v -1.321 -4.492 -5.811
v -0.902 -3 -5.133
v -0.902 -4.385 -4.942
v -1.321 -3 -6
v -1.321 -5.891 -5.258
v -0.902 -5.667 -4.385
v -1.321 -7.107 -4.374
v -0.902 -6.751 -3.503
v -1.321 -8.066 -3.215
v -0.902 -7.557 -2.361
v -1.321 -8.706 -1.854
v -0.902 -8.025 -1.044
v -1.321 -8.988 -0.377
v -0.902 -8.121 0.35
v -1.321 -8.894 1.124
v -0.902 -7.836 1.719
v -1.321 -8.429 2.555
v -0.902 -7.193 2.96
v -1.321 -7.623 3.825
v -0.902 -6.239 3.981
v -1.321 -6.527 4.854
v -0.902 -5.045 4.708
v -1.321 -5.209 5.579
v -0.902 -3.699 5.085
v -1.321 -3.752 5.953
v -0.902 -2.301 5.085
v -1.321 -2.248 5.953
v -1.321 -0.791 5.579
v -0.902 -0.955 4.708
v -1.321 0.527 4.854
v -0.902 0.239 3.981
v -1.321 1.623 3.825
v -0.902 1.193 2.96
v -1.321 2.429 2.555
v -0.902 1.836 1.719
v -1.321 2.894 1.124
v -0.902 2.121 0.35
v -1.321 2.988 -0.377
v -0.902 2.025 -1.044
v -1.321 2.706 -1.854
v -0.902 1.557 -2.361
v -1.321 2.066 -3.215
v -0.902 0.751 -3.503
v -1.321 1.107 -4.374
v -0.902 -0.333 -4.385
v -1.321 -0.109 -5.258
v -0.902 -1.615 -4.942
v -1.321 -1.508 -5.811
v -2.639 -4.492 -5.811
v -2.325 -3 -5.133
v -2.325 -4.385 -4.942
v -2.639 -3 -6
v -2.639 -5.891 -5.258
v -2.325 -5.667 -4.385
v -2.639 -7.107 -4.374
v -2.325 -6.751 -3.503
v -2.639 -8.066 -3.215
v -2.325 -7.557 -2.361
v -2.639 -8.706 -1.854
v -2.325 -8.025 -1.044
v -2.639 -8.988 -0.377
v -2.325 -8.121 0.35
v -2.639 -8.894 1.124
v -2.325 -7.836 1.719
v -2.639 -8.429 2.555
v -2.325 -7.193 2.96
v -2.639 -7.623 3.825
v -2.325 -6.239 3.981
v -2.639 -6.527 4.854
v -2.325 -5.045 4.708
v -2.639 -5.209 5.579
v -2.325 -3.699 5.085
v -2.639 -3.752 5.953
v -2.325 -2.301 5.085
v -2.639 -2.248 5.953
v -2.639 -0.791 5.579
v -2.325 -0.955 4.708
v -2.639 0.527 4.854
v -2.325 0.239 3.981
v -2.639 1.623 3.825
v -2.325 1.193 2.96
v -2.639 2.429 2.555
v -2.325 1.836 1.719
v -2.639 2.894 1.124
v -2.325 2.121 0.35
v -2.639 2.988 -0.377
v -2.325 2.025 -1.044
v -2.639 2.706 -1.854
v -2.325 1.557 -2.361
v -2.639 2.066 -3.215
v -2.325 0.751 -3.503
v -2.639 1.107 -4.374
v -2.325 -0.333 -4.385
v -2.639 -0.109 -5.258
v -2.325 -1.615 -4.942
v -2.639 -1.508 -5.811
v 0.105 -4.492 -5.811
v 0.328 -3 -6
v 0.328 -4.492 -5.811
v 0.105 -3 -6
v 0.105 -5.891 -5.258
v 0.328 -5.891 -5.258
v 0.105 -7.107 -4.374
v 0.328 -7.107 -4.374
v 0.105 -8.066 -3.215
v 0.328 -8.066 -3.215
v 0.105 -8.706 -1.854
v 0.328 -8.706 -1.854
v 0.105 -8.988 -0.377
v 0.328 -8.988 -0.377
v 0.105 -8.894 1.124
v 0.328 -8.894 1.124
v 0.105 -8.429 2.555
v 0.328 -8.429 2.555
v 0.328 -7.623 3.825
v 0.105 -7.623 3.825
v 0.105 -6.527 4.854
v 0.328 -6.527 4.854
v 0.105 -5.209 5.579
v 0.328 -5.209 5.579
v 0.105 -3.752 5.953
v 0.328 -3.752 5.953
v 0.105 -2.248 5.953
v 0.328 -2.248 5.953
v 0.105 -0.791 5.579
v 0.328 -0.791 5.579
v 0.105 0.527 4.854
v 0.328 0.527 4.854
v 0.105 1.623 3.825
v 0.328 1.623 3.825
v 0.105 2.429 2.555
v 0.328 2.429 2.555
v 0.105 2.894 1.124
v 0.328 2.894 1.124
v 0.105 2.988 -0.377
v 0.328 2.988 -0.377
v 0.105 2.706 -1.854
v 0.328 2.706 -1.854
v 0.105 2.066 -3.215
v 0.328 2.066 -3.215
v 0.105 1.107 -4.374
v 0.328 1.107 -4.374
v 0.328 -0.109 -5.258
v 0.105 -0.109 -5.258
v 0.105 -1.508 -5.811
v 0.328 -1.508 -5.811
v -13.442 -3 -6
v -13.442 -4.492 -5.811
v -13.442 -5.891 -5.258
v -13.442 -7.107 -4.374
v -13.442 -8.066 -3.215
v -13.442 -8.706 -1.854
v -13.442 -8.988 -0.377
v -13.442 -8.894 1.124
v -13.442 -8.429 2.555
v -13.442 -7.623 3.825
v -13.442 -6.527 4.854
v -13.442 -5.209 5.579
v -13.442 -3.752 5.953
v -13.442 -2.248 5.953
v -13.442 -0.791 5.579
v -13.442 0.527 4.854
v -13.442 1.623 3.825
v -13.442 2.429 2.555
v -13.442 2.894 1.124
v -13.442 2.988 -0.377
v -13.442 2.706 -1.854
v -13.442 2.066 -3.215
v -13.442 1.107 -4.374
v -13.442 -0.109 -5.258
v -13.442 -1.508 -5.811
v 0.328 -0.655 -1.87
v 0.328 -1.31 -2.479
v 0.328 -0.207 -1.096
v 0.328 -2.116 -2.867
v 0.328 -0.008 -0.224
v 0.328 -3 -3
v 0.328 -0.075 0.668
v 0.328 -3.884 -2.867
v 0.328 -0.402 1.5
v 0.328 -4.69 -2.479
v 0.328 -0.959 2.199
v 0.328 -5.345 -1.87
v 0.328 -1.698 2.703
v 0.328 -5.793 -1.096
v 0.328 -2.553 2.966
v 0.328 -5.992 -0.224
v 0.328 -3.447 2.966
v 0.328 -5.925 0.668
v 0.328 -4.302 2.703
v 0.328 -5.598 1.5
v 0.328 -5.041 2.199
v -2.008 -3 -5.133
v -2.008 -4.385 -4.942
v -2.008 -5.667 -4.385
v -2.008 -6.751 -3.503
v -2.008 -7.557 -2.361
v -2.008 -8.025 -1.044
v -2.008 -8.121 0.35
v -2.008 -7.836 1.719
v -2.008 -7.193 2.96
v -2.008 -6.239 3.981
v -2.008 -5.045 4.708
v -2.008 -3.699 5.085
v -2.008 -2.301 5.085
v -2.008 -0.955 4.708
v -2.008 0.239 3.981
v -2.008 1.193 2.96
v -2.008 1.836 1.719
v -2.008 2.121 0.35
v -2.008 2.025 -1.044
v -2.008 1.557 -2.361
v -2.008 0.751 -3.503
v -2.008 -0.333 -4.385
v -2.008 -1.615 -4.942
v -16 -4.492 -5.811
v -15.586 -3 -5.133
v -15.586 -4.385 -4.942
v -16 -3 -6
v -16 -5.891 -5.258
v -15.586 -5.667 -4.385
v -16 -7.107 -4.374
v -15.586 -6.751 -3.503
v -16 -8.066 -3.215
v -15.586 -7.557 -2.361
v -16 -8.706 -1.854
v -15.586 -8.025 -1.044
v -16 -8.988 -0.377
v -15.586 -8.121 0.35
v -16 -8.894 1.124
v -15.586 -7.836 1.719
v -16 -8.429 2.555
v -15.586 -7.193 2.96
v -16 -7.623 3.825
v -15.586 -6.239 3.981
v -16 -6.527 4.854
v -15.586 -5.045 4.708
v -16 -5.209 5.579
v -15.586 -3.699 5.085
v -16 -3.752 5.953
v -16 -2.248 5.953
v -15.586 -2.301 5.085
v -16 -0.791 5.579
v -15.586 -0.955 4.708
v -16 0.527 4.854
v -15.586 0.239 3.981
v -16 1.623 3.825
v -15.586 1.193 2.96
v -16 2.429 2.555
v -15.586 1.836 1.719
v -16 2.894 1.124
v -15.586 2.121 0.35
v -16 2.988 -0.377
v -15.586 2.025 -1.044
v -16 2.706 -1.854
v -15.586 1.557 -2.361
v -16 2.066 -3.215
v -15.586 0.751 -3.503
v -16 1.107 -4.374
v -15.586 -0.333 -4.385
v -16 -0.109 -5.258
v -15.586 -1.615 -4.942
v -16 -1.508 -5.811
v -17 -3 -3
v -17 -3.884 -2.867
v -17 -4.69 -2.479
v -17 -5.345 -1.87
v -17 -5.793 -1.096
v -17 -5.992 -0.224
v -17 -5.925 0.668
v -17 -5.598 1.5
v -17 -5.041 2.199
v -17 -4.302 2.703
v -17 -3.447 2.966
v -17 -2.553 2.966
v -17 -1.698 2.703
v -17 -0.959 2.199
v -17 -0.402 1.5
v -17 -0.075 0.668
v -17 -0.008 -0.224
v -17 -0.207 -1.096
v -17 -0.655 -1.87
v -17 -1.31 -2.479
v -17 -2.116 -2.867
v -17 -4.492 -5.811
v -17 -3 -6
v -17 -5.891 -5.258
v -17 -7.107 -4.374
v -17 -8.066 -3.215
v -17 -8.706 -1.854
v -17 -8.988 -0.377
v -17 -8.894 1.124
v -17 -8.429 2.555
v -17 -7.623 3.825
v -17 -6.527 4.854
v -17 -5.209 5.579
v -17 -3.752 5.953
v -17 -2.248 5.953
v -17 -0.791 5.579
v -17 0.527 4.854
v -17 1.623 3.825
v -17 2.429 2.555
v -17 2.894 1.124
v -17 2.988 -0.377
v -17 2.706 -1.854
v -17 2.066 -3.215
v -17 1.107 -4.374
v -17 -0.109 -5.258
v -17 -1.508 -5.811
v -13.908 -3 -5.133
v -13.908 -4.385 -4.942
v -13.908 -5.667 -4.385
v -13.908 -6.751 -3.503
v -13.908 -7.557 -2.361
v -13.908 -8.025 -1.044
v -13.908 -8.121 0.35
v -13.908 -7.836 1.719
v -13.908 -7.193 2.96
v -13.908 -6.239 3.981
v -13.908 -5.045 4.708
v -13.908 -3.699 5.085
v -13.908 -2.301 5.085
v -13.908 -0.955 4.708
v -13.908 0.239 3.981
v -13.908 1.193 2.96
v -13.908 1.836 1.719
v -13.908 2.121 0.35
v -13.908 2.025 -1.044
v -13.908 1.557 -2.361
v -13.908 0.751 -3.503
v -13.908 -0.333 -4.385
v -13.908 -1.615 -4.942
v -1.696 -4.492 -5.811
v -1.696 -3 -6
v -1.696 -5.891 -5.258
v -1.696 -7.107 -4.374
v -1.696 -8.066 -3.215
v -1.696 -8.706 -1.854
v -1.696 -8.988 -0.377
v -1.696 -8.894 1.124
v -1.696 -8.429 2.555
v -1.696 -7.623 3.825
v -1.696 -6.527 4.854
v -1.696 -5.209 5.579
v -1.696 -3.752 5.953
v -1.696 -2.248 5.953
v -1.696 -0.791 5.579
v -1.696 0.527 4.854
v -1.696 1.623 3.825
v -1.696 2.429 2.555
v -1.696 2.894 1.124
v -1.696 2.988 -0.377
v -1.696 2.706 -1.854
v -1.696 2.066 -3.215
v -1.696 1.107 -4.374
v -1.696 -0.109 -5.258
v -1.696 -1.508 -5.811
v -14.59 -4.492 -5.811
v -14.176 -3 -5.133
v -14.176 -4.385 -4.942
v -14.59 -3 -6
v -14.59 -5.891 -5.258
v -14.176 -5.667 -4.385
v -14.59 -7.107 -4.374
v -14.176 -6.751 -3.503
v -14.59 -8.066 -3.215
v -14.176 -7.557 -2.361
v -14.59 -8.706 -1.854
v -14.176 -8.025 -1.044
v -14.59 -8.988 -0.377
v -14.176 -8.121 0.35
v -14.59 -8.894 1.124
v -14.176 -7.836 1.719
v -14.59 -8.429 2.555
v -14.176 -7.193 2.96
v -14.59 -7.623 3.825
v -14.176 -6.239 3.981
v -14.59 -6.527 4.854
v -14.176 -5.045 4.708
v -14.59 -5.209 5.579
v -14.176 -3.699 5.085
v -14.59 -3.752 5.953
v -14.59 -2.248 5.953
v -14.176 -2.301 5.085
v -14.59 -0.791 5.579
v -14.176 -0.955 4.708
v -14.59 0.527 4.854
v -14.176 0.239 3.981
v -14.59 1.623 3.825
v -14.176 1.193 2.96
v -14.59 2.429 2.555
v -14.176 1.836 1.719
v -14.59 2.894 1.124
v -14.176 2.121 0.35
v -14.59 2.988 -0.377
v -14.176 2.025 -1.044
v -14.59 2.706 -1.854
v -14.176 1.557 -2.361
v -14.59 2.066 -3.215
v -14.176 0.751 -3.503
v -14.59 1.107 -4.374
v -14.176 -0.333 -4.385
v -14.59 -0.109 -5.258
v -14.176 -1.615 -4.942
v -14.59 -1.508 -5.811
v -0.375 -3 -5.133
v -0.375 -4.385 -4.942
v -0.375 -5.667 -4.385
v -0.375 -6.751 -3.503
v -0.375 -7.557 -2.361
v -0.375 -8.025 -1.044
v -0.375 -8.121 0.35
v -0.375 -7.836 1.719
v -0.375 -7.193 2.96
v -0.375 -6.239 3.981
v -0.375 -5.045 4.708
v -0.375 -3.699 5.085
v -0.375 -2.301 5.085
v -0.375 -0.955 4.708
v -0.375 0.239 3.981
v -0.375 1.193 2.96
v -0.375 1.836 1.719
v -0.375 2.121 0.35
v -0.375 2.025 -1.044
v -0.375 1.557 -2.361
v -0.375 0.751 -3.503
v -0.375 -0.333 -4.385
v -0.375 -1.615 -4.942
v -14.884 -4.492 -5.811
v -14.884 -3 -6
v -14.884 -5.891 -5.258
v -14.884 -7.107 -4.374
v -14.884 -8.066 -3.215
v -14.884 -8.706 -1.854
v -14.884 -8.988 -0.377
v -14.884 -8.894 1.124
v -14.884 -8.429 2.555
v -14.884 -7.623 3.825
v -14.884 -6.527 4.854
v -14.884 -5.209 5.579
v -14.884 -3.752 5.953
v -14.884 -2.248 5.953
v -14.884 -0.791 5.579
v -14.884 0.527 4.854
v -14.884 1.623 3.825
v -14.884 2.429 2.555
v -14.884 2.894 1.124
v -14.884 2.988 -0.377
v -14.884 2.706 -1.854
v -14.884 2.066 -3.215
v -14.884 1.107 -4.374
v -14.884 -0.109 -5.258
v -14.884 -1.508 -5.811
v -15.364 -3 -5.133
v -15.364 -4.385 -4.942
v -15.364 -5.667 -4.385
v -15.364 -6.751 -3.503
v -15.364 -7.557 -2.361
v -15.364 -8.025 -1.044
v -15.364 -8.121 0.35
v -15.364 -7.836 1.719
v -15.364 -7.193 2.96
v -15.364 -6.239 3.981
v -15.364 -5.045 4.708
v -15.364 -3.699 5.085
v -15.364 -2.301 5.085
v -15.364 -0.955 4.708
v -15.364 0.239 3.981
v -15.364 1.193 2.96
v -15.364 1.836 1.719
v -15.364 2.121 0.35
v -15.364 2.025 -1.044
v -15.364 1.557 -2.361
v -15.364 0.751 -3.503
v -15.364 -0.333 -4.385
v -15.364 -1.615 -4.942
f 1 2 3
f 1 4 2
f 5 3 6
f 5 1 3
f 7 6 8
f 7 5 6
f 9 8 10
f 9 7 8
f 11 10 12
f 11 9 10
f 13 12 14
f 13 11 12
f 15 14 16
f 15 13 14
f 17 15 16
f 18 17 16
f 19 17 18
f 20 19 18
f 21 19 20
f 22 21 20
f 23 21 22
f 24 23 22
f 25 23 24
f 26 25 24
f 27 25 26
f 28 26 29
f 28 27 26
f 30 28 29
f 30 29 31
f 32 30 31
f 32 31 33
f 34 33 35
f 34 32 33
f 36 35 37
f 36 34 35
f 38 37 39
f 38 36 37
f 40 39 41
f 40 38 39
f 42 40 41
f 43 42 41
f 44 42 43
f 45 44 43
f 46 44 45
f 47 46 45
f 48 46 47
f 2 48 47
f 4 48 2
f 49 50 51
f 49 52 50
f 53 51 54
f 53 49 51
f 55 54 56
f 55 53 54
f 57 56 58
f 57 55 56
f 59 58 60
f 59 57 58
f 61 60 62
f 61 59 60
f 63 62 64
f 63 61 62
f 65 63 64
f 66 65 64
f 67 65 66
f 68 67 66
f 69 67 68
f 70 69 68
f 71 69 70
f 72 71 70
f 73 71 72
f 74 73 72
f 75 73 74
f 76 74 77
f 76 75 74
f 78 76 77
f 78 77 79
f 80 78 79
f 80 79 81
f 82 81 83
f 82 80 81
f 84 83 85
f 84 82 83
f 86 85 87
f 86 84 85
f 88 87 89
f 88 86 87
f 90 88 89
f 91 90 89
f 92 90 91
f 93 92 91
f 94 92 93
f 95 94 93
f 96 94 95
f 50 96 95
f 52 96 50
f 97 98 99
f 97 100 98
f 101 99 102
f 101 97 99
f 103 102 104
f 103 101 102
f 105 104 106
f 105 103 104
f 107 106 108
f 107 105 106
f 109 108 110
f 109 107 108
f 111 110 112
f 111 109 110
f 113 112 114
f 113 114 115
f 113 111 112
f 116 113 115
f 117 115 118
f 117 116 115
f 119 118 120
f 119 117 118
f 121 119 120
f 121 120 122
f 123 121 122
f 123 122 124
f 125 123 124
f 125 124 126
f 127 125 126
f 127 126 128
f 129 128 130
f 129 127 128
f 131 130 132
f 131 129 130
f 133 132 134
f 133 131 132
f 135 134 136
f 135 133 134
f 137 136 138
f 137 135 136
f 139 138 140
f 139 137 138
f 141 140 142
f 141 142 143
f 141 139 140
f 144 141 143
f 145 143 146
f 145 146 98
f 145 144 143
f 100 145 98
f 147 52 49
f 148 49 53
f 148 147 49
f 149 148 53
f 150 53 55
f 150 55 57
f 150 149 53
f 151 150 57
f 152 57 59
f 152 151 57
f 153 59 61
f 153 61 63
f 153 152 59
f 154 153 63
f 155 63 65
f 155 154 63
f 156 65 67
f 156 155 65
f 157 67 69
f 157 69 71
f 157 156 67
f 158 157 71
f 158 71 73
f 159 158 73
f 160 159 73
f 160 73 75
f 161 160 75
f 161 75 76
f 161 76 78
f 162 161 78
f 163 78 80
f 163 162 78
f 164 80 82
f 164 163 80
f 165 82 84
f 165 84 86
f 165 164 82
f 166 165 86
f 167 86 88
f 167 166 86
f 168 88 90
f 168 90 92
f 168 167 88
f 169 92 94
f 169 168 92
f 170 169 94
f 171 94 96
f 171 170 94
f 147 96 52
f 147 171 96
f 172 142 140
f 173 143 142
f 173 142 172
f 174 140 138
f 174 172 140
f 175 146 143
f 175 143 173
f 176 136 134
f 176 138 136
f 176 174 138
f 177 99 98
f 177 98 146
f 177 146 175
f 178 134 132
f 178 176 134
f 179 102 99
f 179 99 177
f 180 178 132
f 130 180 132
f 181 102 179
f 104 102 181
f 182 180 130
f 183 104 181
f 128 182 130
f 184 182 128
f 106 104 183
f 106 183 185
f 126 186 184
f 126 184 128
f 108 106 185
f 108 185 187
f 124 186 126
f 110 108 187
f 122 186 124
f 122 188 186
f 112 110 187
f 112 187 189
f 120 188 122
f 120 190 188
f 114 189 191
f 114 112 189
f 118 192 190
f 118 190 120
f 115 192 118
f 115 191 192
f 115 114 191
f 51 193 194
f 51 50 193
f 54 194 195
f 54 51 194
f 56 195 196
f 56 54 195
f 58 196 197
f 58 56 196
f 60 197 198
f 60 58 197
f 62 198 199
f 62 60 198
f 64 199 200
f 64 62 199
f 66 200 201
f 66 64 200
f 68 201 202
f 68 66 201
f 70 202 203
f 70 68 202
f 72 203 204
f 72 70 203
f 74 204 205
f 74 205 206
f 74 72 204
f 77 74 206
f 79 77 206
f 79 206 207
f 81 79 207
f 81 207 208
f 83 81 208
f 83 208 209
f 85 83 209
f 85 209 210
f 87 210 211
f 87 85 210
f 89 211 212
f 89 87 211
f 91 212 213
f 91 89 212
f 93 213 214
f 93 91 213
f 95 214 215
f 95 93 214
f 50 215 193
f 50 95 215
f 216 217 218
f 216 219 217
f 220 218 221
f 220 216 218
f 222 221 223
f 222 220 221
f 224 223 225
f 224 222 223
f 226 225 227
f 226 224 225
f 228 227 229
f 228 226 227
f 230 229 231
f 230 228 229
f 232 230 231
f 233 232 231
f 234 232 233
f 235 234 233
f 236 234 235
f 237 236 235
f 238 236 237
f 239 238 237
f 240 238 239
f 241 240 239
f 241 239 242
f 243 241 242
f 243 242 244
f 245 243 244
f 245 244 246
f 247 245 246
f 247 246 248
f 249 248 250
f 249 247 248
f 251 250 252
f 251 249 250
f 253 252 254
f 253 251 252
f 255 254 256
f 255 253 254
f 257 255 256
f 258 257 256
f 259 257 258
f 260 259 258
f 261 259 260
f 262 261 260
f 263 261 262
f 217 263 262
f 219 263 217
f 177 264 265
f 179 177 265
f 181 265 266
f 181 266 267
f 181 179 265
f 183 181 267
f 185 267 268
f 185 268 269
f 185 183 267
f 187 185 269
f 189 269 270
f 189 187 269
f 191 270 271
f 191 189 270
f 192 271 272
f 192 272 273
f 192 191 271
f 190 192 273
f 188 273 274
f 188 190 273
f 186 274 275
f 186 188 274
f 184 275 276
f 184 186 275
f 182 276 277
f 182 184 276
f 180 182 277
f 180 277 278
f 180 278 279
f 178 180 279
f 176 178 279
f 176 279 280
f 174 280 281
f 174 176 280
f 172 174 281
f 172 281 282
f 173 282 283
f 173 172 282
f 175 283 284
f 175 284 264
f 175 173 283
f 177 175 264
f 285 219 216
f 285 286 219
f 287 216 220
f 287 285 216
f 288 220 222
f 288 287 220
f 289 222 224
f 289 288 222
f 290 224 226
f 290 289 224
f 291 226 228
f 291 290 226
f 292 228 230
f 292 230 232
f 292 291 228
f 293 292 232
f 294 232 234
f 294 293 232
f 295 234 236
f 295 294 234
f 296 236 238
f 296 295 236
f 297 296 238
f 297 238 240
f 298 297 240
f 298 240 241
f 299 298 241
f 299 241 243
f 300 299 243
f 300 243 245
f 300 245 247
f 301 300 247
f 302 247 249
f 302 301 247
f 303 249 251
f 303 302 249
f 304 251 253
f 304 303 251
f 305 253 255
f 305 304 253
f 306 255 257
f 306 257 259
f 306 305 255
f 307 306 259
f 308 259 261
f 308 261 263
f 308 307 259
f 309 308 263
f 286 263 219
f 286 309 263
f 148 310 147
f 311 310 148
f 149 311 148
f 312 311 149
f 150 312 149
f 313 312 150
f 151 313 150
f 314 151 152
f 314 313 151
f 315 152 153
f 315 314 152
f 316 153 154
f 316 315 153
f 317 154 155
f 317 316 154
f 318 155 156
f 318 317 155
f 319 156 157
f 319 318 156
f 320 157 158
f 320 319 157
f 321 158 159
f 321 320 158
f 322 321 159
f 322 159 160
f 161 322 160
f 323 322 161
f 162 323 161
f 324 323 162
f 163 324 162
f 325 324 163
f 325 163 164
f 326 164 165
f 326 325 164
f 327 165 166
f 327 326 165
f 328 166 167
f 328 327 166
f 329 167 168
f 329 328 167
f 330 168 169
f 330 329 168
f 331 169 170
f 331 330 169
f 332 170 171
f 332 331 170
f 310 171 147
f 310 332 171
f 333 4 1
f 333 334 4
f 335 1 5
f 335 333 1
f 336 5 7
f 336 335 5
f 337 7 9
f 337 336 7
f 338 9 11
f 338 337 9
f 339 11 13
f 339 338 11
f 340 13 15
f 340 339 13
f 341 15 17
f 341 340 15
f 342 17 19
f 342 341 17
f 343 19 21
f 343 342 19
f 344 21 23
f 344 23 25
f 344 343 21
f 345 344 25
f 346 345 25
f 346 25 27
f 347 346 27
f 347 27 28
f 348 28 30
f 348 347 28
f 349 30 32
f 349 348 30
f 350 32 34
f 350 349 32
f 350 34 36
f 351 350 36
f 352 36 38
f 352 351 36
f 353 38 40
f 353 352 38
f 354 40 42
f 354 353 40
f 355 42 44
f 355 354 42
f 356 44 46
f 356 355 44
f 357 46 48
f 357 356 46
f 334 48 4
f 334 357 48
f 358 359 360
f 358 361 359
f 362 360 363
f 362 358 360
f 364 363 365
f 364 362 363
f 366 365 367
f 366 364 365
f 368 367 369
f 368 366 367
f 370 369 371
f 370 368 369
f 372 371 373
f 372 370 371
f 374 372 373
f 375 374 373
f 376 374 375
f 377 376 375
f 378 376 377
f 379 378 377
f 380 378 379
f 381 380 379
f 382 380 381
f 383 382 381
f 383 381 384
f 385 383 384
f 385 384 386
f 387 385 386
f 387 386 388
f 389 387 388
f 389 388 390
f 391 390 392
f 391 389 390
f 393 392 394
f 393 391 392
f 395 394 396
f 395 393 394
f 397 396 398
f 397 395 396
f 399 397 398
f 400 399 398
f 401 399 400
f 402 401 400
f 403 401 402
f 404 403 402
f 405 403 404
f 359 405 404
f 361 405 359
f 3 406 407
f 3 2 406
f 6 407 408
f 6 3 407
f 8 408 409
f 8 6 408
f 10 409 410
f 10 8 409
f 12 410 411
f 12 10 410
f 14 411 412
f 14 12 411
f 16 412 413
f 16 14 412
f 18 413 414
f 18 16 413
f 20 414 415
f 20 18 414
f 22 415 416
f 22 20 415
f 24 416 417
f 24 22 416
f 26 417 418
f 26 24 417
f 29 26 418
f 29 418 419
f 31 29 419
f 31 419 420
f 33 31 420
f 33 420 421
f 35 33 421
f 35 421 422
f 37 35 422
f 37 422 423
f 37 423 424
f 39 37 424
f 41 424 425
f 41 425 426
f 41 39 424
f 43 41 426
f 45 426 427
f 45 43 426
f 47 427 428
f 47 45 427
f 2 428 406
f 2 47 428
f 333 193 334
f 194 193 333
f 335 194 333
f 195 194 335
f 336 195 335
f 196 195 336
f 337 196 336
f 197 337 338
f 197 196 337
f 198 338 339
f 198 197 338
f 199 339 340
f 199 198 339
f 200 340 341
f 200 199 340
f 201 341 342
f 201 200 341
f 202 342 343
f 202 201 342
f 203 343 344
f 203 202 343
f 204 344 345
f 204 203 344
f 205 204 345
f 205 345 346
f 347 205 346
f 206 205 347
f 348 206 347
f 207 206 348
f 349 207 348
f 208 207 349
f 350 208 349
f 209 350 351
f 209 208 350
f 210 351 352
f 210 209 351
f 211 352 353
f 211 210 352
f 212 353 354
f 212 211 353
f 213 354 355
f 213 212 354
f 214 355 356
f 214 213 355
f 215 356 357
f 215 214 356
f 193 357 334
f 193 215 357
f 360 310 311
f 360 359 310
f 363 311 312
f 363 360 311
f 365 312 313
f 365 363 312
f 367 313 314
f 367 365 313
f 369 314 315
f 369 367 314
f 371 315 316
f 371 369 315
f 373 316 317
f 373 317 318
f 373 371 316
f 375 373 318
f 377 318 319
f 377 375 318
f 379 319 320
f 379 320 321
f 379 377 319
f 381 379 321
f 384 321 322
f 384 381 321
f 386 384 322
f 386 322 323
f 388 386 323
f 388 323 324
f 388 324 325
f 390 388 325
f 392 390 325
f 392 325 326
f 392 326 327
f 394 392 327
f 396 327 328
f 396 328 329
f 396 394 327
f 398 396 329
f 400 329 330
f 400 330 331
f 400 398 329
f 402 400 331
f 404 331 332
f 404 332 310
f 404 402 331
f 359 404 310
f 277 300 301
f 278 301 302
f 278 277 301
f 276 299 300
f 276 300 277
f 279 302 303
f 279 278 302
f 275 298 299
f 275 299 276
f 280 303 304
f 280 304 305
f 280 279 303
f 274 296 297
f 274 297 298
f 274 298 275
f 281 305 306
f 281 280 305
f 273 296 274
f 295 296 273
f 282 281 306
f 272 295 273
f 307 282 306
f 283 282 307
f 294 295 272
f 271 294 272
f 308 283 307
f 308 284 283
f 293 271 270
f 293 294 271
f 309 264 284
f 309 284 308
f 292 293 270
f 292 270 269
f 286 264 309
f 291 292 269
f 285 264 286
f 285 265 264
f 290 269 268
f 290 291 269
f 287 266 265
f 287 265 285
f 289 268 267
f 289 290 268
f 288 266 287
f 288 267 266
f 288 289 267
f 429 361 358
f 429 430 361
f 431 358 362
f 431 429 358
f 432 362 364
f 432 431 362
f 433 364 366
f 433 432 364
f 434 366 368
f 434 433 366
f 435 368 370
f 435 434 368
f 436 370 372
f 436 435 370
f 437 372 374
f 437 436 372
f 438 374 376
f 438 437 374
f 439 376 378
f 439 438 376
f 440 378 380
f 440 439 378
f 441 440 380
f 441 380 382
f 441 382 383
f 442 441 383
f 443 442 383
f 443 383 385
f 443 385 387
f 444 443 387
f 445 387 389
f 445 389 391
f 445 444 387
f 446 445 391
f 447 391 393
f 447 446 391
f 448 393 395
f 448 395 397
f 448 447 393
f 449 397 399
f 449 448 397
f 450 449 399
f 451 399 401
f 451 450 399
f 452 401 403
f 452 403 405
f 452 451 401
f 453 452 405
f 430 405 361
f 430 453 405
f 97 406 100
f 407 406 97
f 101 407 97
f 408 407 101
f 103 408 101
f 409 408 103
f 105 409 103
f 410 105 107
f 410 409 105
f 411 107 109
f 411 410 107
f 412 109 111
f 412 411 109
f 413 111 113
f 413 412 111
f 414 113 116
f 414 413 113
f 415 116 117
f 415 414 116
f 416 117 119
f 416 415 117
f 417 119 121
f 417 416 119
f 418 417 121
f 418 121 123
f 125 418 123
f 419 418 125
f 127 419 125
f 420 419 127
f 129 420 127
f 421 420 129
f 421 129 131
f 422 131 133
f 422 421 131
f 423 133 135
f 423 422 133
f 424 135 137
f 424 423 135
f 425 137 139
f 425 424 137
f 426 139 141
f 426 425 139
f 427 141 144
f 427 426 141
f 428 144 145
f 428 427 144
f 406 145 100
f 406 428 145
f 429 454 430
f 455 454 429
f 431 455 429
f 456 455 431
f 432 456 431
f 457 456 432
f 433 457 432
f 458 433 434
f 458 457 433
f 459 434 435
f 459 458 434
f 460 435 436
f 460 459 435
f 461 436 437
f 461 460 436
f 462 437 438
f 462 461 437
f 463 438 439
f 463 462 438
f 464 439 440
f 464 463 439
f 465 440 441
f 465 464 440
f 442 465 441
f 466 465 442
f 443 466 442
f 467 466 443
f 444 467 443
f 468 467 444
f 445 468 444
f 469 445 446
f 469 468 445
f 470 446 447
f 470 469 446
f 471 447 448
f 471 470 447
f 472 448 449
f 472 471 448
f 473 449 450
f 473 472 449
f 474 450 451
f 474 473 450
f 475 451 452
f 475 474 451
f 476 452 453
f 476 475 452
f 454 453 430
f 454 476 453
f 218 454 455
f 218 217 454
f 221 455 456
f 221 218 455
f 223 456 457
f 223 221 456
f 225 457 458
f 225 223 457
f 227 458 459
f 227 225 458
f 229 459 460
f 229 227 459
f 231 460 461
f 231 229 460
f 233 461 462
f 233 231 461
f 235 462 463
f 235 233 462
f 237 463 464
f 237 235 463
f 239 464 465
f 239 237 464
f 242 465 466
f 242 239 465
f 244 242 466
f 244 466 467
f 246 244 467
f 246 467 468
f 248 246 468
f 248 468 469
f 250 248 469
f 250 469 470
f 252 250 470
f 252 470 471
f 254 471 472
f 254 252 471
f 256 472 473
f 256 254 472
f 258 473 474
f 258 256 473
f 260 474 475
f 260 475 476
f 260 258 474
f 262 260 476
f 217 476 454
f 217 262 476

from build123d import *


with BuildPart() as part:
    # Szkic1 → Obrót1 (revolve)
    with BuildSketch(Plane.XY, mode=Mode.PRIVATE) as obr_t1_sk:
        Polygon((-2.324733291, 2.132645156), (-2.639292136, 3), (-13.441762305, 3), (-13.907929964, 2.132645156), (-14.17640763, 2.132645156), (-14.589993676, 3), (-14.883717364, 3), (-15.363713775, 2.132645156), (-15.586413954, 2.132645156), (-16, 3), (-17, 3), (-17, 0), (0, 0), (0.327556569, 0), (0.327556569, 3), (0.104856391, 3), (-0.375140021, 2.132645156), (-0.901728995, 2.132645156), (-1.321140788, 3), (-1.695615602, 3), (-2.008291441, 2.132645156), align=None)
    revolve(obr_t1_sk.sketch.rotate(Axis((0.327556569, -3, 0), (-1, 0, 0)), 90), axis=Axis((0.327556569, -3, 0), (-1, 0, 0)))


solid = part.part
